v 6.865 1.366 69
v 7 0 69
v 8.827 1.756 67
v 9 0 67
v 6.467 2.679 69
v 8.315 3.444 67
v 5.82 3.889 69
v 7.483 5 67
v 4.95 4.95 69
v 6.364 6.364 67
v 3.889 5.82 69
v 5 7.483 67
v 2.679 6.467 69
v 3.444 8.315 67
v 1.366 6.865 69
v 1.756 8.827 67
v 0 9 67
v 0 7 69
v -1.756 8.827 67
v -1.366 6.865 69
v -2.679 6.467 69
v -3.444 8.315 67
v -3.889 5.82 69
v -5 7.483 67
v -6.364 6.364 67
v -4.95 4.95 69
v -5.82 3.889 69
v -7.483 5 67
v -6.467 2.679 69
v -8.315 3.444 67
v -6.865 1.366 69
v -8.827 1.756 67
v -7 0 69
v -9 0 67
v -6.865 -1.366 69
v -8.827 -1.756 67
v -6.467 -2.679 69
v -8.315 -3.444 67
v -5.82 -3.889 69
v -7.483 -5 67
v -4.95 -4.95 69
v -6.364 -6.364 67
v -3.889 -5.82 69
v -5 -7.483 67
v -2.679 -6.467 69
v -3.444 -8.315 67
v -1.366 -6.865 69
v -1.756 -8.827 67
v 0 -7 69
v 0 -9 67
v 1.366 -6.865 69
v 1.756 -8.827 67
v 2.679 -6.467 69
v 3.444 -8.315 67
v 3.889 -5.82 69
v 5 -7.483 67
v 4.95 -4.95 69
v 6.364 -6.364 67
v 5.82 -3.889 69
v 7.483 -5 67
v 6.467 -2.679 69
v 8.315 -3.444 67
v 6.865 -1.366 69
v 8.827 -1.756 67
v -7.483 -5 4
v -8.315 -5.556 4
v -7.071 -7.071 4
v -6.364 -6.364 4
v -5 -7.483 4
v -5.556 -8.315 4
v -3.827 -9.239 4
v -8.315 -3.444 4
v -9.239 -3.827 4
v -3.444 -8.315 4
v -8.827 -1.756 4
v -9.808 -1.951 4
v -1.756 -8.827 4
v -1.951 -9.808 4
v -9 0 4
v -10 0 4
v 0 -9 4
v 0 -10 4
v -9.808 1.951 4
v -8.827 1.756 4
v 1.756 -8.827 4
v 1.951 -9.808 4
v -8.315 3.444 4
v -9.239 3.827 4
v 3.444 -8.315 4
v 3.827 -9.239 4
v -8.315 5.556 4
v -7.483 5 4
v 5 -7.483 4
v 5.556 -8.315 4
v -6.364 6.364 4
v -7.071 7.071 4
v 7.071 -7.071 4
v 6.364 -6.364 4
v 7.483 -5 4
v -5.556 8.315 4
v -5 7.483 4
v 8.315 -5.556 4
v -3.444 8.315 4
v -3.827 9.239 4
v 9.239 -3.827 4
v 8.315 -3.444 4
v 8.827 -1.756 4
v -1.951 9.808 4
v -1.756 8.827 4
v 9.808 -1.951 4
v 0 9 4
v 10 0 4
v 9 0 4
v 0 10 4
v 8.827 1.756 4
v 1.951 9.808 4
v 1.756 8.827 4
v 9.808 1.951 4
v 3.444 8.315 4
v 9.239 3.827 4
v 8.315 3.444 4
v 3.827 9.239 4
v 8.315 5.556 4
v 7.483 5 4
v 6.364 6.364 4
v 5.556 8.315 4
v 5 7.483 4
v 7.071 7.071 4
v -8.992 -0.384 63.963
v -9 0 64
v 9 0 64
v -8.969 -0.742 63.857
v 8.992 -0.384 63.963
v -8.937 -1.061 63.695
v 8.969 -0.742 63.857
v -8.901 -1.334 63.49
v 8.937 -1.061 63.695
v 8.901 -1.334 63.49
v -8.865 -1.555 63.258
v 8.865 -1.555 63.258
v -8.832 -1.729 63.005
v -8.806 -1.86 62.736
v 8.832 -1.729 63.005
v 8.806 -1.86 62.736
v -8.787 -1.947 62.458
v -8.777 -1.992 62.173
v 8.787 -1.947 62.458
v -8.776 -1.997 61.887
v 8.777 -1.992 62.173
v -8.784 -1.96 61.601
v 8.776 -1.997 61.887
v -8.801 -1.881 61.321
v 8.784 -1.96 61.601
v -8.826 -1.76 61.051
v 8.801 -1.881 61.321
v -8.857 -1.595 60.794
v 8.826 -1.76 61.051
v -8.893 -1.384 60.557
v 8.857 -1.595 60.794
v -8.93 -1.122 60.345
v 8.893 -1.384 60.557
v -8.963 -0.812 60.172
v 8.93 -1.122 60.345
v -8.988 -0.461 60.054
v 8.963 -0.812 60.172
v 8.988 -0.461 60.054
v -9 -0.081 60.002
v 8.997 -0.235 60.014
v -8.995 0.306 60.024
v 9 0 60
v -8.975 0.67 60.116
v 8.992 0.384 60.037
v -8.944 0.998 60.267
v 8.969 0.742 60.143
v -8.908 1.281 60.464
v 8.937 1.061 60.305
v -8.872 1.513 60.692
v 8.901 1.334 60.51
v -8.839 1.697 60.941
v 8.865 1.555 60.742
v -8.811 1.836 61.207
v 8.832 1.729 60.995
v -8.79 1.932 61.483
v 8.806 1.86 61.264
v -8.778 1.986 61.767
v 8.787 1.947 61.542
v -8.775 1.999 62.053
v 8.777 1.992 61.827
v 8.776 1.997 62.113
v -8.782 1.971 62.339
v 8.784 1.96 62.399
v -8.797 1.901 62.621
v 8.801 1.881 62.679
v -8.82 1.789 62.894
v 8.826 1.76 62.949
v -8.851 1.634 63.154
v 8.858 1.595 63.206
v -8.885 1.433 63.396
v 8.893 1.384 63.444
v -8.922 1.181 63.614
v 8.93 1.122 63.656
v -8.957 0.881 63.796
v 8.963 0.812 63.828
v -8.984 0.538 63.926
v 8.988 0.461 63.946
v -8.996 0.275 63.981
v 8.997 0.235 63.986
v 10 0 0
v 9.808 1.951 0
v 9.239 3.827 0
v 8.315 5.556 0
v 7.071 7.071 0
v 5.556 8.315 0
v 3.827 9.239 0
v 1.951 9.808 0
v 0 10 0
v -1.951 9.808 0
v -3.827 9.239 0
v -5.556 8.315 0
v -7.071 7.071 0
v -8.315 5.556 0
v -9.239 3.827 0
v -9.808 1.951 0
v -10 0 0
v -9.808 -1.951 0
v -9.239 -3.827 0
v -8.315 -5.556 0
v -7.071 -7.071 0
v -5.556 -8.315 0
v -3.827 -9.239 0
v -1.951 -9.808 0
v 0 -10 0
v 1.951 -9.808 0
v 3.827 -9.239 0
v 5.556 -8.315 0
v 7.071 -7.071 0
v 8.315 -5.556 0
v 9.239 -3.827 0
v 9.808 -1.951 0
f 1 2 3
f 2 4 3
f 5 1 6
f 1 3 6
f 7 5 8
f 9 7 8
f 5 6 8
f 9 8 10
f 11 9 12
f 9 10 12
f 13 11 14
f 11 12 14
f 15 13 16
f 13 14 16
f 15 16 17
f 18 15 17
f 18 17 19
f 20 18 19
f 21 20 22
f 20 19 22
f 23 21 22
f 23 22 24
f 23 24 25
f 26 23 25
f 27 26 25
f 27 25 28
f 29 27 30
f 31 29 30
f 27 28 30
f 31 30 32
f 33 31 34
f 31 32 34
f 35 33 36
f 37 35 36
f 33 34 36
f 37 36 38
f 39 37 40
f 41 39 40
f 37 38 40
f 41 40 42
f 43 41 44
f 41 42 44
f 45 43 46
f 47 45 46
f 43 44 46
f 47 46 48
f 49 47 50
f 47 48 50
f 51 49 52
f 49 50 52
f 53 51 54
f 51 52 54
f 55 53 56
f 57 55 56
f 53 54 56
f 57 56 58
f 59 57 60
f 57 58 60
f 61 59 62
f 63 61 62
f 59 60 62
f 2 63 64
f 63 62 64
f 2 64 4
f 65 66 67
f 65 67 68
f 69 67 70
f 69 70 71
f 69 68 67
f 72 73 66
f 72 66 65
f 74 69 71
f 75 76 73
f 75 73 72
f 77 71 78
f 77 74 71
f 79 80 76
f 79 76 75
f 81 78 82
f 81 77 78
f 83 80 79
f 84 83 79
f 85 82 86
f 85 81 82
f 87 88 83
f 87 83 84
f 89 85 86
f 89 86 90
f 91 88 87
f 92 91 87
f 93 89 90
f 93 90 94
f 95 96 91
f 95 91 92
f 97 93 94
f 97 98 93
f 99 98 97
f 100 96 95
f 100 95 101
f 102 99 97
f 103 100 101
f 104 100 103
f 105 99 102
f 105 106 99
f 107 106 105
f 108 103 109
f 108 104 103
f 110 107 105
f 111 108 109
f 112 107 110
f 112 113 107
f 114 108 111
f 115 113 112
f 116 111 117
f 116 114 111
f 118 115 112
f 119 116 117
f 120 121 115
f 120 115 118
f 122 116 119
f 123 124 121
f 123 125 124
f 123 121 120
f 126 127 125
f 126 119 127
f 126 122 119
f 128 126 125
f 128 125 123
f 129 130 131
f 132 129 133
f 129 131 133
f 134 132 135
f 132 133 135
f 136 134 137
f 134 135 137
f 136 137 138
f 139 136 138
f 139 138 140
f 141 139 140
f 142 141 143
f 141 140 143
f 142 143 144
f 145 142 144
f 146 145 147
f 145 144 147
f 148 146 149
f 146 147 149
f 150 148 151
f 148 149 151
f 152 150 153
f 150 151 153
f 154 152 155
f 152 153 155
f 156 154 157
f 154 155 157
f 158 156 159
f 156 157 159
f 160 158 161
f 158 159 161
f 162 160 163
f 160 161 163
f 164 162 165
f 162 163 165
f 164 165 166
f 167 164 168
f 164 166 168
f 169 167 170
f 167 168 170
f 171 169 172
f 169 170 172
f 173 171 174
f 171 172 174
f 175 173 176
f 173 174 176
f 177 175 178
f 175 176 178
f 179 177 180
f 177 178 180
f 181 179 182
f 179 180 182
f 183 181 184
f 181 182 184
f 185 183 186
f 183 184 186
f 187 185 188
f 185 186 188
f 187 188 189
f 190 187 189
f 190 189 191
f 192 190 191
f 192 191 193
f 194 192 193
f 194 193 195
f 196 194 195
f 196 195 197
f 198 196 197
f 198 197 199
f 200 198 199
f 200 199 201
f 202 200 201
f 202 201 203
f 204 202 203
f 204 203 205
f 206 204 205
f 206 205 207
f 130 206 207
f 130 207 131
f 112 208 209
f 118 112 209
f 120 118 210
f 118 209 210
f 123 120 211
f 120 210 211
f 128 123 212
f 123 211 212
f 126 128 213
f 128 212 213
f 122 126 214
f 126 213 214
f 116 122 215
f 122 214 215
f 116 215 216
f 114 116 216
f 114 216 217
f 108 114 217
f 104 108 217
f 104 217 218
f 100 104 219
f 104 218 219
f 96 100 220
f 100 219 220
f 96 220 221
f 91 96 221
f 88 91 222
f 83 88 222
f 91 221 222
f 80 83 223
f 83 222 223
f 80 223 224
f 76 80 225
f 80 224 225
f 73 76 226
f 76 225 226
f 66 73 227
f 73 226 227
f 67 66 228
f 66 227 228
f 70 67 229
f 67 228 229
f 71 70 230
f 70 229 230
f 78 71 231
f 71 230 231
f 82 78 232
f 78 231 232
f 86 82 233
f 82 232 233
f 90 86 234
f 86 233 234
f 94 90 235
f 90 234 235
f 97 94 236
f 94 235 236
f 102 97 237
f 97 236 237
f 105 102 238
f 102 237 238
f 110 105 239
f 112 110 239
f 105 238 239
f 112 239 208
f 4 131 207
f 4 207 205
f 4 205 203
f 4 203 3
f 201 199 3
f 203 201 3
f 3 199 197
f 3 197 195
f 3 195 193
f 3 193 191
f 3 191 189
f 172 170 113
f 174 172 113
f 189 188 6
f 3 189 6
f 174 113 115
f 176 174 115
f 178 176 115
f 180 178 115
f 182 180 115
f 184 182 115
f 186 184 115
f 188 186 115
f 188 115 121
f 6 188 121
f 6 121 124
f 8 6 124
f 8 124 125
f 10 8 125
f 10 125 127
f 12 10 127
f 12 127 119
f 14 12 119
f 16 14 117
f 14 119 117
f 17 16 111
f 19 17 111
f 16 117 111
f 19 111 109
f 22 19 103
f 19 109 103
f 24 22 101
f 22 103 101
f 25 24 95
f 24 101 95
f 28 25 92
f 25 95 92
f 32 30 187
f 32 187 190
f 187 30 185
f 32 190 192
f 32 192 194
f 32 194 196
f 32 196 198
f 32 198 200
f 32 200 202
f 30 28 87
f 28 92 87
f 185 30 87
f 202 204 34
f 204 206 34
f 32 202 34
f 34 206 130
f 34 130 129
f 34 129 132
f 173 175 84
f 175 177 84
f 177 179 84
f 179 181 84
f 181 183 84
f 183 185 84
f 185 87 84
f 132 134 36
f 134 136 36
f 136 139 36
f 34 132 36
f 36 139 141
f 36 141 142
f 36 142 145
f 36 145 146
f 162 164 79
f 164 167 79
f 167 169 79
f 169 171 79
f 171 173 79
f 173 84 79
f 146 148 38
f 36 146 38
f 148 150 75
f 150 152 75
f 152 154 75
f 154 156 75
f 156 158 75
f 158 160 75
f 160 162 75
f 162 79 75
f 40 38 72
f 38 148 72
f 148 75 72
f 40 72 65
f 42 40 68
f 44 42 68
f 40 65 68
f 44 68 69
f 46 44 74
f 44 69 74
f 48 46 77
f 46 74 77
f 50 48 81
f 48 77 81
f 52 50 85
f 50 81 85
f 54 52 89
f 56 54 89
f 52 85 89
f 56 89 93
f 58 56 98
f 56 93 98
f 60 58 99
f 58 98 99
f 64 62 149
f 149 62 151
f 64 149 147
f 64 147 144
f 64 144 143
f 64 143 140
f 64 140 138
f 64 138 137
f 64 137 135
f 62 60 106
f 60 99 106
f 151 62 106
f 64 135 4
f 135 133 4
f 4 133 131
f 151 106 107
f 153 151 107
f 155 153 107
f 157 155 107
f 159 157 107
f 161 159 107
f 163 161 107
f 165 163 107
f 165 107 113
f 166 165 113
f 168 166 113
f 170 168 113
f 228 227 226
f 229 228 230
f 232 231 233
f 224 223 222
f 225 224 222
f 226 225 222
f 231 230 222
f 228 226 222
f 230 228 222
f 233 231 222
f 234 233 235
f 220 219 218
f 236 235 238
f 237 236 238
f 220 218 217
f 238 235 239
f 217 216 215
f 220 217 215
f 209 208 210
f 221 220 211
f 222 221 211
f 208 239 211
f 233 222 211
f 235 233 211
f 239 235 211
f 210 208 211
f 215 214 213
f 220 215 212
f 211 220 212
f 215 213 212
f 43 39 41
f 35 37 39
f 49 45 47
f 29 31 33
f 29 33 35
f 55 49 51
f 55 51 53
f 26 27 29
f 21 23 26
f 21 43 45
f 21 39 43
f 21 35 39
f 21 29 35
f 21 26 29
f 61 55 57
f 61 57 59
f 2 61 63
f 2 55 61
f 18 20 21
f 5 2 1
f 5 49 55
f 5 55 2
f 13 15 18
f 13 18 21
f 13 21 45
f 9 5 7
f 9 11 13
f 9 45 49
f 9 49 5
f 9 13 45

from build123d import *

# Parameters (mm, degrees)
SKETCH1_R           = 10
BOSS_EXTRUDE1_DEPTH = 4
SKETCH2_R           = 9
BOSS_EXTRUDE2_DEPTH = 65
CHAMFER4_SIZE       = 2
SKETCH3_R           = 2
CUT_EXTRUDE1_DEPTH  = 32.5


with BuildPart() as part:
    # Sketch1 → Boss-Extrude1 (new body)
    with BuildSketch(Plane.XY):
        Circle(SKETCH1_R)
    extrude(amount=BOSS_EXTRUDE1_DEPTH)

    # Sketch2 → Boss-Extrude2 (add)
    with BuildSketch(Plane.XY.offset(4)):
        Circle(SKETCH2_R)
    extrude(amount=BOSS_EXTRUDE2_DEPTH)

    # Chamfer4
    chamfer4_edges = [part.edges().sort_by_distance(p)[0] for p in [
        (-9, 0, 69),
    ]]
    chamfer(chamfer4_edges, length=CHAMFER4_SIZE)

    # Sketch3 → Cut-Extrude1 (cut, symmetric)
    with BuildSketch(Plane(origin=(0, 0, 0), x_dir=(0, 0, -1), z_dir=(1, 0, 0))):
        with Locations((-62, 0)):
            Circle(SKETCH3_R)
    extrude(amount=CUT_EXTRUDE1_DEPTH, both=True, mode=Mode.SUBTRACT)


solid = part.part
